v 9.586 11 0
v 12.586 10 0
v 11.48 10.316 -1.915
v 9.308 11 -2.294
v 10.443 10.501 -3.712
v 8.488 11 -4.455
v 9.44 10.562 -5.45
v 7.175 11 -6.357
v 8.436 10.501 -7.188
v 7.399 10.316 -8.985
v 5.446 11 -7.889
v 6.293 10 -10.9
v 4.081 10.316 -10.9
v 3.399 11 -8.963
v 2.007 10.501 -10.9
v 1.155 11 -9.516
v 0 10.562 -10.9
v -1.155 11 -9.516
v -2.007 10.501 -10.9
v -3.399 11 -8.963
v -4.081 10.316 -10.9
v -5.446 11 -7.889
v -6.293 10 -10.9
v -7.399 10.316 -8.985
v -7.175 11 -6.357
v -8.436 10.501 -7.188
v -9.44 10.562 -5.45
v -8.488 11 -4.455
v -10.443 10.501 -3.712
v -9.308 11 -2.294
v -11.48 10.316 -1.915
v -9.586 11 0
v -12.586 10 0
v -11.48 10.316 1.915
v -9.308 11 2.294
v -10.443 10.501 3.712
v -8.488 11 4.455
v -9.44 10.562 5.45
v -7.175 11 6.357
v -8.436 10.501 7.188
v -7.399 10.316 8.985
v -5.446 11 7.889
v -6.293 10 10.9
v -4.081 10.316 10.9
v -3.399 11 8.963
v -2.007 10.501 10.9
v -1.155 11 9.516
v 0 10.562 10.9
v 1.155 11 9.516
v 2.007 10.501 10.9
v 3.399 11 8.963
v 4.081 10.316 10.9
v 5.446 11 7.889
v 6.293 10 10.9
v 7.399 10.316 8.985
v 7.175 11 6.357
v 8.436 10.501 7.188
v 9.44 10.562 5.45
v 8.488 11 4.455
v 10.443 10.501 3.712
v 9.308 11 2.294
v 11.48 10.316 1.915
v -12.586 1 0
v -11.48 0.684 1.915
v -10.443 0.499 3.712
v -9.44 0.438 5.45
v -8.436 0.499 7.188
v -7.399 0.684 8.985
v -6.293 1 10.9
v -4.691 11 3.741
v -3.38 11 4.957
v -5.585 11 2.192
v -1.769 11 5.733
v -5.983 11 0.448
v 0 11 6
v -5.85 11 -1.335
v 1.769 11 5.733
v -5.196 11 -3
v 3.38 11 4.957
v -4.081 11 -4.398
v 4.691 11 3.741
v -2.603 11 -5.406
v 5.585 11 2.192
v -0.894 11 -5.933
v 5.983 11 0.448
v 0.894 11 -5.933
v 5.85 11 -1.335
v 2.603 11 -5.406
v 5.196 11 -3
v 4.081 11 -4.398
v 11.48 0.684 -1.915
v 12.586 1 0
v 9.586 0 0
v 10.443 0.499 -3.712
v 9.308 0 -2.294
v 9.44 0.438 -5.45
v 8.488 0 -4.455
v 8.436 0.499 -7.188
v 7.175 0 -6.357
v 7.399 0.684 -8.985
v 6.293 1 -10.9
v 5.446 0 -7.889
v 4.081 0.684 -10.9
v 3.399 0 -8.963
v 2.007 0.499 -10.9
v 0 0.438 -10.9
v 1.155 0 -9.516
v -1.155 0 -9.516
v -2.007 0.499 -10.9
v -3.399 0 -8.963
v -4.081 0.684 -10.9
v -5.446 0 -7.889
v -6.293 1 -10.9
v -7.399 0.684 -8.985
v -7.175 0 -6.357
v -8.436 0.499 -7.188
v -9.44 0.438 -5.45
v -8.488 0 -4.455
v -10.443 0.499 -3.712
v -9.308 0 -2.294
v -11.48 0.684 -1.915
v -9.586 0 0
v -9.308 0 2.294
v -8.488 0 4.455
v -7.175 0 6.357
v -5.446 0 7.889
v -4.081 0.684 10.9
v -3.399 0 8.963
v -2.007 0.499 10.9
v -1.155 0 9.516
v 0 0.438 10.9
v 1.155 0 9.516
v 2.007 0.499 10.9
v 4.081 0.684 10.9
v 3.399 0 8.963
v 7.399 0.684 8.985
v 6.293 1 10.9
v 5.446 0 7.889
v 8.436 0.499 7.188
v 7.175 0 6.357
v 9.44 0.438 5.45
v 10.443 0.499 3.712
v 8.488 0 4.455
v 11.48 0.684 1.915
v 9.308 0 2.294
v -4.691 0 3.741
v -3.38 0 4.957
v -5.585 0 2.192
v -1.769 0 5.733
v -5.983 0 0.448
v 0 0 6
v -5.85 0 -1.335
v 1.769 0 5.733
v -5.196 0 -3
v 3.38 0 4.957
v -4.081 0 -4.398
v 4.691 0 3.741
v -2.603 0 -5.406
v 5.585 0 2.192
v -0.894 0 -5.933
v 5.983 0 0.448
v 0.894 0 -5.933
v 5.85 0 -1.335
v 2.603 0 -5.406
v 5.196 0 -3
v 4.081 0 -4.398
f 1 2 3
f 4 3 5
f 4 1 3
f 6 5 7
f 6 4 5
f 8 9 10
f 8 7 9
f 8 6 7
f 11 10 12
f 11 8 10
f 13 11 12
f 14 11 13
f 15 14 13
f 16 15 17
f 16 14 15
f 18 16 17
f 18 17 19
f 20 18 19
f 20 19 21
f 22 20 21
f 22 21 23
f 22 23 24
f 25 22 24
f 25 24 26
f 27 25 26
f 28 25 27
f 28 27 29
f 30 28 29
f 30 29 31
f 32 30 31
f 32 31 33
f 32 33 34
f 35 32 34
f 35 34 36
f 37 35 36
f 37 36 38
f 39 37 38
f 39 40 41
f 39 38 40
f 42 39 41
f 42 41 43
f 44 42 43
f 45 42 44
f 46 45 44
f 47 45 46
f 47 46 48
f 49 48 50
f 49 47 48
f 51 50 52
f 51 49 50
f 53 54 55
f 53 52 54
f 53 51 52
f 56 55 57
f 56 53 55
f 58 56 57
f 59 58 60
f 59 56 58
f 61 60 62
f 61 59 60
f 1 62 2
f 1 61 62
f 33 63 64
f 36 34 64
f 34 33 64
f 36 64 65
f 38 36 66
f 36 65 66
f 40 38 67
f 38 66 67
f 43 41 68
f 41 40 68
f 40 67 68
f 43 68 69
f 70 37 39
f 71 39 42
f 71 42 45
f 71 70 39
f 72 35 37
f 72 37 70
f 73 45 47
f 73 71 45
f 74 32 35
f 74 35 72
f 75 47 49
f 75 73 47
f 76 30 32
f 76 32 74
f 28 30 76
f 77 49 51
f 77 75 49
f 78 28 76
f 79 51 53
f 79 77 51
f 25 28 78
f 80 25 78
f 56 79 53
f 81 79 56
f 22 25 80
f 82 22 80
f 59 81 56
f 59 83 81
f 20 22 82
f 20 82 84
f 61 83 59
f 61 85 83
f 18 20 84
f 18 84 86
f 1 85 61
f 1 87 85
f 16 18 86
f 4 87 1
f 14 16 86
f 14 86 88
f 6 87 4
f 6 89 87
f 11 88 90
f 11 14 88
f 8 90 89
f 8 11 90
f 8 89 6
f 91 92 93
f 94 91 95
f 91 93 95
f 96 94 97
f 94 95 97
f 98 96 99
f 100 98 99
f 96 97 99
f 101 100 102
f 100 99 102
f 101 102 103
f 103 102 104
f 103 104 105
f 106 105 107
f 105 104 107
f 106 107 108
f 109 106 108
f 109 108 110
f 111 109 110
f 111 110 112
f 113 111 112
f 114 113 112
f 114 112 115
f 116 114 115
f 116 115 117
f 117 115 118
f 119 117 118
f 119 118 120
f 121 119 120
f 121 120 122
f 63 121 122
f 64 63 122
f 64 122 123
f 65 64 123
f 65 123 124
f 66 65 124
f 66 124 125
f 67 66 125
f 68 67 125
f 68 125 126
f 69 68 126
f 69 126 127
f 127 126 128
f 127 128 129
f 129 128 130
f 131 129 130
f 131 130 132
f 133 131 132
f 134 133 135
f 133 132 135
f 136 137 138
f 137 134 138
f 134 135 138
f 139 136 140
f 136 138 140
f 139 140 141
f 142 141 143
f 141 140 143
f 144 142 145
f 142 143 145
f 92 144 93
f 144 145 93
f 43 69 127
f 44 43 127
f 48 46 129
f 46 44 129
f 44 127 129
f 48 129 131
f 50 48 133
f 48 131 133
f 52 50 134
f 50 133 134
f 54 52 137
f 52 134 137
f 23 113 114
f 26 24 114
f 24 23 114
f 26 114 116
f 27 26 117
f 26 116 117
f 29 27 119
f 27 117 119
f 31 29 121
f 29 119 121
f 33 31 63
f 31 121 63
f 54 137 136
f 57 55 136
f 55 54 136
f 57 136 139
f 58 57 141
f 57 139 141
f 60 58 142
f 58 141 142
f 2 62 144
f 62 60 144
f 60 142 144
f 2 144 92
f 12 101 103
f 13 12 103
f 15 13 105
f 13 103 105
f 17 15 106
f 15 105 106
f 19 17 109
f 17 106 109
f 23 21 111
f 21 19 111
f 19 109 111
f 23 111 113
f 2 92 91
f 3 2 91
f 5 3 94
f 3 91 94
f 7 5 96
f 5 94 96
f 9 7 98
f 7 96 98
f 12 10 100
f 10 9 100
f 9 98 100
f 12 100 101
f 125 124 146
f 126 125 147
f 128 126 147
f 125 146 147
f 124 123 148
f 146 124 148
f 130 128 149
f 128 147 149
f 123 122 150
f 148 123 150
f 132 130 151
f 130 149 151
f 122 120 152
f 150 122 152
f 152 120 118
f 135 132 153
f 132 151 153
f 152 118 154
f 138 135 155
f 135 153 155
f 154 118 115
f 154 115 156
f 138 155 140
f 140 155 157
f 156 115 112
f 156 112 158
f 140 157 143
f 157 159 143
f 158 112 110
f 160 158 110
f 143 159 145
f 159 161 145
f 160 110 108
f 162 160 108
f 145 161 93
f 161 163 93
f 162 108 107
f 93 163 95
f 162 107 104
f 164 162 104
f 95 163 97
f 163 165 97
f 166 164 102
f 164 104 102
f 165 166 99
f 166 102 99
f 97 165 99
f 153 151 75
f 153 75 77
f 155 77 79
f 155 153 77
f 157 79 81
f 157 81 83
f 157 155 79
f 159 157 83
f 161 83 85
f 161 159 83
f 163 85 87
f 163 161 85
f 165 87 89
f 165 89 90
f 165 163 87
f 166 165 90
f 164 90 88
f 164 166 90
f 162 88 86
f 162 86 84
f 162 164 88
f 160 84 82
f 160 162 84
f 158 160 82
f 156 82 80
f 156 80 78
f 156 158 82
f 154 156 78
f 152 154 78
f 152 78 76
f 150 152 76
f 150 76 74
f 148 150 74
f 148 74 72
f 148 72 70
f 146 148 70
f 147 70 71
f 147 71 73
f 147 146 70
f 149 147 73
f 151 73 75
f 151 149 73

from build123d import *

# Parameters (mm, degrees)
SKETCH_1_R      = 6
EXTRUDE_1_DEPTH = 11


with BuildPart() as part:
    # 草图1 → 凸台-拉伸1 (new body)
    with BuildSketch(Plane(origin=(0, 0, 0), x_dir=(1, 0, 0), z_dir=(0, 1, 0))):
        Polygon((12.586235868, 0), (6.293117934, 10.9), (-6.293117934, 10.9), (-12.586235868, 0), (-6.293117934, -10.9), (6.293117934, -10.9), align=None)
        with Locations(Location((0, 0, 0), (0, 0, 270))):
            Circle(SKETCH_1_R, mode=Mode.SUBTRACT)
    extrude(amount=EXTRUDE_1_DEPTH)

    # 草图2 → 切除-旋转3 (revolve, cut)
    with BuildSketch(Plane.XY):
        Polygon((12.586235868, 10), (9.586235868, 11), (12.586235868, 11), align=None)
        Polygon((12.586235868, 1), (9.586235868, 0), (12.586235868, 0), align=None)
    revolve(axis=Axis((0, 0, 0), (0, 1, 0)), mode=Mode.SUBTRACT)


solid = part.part
